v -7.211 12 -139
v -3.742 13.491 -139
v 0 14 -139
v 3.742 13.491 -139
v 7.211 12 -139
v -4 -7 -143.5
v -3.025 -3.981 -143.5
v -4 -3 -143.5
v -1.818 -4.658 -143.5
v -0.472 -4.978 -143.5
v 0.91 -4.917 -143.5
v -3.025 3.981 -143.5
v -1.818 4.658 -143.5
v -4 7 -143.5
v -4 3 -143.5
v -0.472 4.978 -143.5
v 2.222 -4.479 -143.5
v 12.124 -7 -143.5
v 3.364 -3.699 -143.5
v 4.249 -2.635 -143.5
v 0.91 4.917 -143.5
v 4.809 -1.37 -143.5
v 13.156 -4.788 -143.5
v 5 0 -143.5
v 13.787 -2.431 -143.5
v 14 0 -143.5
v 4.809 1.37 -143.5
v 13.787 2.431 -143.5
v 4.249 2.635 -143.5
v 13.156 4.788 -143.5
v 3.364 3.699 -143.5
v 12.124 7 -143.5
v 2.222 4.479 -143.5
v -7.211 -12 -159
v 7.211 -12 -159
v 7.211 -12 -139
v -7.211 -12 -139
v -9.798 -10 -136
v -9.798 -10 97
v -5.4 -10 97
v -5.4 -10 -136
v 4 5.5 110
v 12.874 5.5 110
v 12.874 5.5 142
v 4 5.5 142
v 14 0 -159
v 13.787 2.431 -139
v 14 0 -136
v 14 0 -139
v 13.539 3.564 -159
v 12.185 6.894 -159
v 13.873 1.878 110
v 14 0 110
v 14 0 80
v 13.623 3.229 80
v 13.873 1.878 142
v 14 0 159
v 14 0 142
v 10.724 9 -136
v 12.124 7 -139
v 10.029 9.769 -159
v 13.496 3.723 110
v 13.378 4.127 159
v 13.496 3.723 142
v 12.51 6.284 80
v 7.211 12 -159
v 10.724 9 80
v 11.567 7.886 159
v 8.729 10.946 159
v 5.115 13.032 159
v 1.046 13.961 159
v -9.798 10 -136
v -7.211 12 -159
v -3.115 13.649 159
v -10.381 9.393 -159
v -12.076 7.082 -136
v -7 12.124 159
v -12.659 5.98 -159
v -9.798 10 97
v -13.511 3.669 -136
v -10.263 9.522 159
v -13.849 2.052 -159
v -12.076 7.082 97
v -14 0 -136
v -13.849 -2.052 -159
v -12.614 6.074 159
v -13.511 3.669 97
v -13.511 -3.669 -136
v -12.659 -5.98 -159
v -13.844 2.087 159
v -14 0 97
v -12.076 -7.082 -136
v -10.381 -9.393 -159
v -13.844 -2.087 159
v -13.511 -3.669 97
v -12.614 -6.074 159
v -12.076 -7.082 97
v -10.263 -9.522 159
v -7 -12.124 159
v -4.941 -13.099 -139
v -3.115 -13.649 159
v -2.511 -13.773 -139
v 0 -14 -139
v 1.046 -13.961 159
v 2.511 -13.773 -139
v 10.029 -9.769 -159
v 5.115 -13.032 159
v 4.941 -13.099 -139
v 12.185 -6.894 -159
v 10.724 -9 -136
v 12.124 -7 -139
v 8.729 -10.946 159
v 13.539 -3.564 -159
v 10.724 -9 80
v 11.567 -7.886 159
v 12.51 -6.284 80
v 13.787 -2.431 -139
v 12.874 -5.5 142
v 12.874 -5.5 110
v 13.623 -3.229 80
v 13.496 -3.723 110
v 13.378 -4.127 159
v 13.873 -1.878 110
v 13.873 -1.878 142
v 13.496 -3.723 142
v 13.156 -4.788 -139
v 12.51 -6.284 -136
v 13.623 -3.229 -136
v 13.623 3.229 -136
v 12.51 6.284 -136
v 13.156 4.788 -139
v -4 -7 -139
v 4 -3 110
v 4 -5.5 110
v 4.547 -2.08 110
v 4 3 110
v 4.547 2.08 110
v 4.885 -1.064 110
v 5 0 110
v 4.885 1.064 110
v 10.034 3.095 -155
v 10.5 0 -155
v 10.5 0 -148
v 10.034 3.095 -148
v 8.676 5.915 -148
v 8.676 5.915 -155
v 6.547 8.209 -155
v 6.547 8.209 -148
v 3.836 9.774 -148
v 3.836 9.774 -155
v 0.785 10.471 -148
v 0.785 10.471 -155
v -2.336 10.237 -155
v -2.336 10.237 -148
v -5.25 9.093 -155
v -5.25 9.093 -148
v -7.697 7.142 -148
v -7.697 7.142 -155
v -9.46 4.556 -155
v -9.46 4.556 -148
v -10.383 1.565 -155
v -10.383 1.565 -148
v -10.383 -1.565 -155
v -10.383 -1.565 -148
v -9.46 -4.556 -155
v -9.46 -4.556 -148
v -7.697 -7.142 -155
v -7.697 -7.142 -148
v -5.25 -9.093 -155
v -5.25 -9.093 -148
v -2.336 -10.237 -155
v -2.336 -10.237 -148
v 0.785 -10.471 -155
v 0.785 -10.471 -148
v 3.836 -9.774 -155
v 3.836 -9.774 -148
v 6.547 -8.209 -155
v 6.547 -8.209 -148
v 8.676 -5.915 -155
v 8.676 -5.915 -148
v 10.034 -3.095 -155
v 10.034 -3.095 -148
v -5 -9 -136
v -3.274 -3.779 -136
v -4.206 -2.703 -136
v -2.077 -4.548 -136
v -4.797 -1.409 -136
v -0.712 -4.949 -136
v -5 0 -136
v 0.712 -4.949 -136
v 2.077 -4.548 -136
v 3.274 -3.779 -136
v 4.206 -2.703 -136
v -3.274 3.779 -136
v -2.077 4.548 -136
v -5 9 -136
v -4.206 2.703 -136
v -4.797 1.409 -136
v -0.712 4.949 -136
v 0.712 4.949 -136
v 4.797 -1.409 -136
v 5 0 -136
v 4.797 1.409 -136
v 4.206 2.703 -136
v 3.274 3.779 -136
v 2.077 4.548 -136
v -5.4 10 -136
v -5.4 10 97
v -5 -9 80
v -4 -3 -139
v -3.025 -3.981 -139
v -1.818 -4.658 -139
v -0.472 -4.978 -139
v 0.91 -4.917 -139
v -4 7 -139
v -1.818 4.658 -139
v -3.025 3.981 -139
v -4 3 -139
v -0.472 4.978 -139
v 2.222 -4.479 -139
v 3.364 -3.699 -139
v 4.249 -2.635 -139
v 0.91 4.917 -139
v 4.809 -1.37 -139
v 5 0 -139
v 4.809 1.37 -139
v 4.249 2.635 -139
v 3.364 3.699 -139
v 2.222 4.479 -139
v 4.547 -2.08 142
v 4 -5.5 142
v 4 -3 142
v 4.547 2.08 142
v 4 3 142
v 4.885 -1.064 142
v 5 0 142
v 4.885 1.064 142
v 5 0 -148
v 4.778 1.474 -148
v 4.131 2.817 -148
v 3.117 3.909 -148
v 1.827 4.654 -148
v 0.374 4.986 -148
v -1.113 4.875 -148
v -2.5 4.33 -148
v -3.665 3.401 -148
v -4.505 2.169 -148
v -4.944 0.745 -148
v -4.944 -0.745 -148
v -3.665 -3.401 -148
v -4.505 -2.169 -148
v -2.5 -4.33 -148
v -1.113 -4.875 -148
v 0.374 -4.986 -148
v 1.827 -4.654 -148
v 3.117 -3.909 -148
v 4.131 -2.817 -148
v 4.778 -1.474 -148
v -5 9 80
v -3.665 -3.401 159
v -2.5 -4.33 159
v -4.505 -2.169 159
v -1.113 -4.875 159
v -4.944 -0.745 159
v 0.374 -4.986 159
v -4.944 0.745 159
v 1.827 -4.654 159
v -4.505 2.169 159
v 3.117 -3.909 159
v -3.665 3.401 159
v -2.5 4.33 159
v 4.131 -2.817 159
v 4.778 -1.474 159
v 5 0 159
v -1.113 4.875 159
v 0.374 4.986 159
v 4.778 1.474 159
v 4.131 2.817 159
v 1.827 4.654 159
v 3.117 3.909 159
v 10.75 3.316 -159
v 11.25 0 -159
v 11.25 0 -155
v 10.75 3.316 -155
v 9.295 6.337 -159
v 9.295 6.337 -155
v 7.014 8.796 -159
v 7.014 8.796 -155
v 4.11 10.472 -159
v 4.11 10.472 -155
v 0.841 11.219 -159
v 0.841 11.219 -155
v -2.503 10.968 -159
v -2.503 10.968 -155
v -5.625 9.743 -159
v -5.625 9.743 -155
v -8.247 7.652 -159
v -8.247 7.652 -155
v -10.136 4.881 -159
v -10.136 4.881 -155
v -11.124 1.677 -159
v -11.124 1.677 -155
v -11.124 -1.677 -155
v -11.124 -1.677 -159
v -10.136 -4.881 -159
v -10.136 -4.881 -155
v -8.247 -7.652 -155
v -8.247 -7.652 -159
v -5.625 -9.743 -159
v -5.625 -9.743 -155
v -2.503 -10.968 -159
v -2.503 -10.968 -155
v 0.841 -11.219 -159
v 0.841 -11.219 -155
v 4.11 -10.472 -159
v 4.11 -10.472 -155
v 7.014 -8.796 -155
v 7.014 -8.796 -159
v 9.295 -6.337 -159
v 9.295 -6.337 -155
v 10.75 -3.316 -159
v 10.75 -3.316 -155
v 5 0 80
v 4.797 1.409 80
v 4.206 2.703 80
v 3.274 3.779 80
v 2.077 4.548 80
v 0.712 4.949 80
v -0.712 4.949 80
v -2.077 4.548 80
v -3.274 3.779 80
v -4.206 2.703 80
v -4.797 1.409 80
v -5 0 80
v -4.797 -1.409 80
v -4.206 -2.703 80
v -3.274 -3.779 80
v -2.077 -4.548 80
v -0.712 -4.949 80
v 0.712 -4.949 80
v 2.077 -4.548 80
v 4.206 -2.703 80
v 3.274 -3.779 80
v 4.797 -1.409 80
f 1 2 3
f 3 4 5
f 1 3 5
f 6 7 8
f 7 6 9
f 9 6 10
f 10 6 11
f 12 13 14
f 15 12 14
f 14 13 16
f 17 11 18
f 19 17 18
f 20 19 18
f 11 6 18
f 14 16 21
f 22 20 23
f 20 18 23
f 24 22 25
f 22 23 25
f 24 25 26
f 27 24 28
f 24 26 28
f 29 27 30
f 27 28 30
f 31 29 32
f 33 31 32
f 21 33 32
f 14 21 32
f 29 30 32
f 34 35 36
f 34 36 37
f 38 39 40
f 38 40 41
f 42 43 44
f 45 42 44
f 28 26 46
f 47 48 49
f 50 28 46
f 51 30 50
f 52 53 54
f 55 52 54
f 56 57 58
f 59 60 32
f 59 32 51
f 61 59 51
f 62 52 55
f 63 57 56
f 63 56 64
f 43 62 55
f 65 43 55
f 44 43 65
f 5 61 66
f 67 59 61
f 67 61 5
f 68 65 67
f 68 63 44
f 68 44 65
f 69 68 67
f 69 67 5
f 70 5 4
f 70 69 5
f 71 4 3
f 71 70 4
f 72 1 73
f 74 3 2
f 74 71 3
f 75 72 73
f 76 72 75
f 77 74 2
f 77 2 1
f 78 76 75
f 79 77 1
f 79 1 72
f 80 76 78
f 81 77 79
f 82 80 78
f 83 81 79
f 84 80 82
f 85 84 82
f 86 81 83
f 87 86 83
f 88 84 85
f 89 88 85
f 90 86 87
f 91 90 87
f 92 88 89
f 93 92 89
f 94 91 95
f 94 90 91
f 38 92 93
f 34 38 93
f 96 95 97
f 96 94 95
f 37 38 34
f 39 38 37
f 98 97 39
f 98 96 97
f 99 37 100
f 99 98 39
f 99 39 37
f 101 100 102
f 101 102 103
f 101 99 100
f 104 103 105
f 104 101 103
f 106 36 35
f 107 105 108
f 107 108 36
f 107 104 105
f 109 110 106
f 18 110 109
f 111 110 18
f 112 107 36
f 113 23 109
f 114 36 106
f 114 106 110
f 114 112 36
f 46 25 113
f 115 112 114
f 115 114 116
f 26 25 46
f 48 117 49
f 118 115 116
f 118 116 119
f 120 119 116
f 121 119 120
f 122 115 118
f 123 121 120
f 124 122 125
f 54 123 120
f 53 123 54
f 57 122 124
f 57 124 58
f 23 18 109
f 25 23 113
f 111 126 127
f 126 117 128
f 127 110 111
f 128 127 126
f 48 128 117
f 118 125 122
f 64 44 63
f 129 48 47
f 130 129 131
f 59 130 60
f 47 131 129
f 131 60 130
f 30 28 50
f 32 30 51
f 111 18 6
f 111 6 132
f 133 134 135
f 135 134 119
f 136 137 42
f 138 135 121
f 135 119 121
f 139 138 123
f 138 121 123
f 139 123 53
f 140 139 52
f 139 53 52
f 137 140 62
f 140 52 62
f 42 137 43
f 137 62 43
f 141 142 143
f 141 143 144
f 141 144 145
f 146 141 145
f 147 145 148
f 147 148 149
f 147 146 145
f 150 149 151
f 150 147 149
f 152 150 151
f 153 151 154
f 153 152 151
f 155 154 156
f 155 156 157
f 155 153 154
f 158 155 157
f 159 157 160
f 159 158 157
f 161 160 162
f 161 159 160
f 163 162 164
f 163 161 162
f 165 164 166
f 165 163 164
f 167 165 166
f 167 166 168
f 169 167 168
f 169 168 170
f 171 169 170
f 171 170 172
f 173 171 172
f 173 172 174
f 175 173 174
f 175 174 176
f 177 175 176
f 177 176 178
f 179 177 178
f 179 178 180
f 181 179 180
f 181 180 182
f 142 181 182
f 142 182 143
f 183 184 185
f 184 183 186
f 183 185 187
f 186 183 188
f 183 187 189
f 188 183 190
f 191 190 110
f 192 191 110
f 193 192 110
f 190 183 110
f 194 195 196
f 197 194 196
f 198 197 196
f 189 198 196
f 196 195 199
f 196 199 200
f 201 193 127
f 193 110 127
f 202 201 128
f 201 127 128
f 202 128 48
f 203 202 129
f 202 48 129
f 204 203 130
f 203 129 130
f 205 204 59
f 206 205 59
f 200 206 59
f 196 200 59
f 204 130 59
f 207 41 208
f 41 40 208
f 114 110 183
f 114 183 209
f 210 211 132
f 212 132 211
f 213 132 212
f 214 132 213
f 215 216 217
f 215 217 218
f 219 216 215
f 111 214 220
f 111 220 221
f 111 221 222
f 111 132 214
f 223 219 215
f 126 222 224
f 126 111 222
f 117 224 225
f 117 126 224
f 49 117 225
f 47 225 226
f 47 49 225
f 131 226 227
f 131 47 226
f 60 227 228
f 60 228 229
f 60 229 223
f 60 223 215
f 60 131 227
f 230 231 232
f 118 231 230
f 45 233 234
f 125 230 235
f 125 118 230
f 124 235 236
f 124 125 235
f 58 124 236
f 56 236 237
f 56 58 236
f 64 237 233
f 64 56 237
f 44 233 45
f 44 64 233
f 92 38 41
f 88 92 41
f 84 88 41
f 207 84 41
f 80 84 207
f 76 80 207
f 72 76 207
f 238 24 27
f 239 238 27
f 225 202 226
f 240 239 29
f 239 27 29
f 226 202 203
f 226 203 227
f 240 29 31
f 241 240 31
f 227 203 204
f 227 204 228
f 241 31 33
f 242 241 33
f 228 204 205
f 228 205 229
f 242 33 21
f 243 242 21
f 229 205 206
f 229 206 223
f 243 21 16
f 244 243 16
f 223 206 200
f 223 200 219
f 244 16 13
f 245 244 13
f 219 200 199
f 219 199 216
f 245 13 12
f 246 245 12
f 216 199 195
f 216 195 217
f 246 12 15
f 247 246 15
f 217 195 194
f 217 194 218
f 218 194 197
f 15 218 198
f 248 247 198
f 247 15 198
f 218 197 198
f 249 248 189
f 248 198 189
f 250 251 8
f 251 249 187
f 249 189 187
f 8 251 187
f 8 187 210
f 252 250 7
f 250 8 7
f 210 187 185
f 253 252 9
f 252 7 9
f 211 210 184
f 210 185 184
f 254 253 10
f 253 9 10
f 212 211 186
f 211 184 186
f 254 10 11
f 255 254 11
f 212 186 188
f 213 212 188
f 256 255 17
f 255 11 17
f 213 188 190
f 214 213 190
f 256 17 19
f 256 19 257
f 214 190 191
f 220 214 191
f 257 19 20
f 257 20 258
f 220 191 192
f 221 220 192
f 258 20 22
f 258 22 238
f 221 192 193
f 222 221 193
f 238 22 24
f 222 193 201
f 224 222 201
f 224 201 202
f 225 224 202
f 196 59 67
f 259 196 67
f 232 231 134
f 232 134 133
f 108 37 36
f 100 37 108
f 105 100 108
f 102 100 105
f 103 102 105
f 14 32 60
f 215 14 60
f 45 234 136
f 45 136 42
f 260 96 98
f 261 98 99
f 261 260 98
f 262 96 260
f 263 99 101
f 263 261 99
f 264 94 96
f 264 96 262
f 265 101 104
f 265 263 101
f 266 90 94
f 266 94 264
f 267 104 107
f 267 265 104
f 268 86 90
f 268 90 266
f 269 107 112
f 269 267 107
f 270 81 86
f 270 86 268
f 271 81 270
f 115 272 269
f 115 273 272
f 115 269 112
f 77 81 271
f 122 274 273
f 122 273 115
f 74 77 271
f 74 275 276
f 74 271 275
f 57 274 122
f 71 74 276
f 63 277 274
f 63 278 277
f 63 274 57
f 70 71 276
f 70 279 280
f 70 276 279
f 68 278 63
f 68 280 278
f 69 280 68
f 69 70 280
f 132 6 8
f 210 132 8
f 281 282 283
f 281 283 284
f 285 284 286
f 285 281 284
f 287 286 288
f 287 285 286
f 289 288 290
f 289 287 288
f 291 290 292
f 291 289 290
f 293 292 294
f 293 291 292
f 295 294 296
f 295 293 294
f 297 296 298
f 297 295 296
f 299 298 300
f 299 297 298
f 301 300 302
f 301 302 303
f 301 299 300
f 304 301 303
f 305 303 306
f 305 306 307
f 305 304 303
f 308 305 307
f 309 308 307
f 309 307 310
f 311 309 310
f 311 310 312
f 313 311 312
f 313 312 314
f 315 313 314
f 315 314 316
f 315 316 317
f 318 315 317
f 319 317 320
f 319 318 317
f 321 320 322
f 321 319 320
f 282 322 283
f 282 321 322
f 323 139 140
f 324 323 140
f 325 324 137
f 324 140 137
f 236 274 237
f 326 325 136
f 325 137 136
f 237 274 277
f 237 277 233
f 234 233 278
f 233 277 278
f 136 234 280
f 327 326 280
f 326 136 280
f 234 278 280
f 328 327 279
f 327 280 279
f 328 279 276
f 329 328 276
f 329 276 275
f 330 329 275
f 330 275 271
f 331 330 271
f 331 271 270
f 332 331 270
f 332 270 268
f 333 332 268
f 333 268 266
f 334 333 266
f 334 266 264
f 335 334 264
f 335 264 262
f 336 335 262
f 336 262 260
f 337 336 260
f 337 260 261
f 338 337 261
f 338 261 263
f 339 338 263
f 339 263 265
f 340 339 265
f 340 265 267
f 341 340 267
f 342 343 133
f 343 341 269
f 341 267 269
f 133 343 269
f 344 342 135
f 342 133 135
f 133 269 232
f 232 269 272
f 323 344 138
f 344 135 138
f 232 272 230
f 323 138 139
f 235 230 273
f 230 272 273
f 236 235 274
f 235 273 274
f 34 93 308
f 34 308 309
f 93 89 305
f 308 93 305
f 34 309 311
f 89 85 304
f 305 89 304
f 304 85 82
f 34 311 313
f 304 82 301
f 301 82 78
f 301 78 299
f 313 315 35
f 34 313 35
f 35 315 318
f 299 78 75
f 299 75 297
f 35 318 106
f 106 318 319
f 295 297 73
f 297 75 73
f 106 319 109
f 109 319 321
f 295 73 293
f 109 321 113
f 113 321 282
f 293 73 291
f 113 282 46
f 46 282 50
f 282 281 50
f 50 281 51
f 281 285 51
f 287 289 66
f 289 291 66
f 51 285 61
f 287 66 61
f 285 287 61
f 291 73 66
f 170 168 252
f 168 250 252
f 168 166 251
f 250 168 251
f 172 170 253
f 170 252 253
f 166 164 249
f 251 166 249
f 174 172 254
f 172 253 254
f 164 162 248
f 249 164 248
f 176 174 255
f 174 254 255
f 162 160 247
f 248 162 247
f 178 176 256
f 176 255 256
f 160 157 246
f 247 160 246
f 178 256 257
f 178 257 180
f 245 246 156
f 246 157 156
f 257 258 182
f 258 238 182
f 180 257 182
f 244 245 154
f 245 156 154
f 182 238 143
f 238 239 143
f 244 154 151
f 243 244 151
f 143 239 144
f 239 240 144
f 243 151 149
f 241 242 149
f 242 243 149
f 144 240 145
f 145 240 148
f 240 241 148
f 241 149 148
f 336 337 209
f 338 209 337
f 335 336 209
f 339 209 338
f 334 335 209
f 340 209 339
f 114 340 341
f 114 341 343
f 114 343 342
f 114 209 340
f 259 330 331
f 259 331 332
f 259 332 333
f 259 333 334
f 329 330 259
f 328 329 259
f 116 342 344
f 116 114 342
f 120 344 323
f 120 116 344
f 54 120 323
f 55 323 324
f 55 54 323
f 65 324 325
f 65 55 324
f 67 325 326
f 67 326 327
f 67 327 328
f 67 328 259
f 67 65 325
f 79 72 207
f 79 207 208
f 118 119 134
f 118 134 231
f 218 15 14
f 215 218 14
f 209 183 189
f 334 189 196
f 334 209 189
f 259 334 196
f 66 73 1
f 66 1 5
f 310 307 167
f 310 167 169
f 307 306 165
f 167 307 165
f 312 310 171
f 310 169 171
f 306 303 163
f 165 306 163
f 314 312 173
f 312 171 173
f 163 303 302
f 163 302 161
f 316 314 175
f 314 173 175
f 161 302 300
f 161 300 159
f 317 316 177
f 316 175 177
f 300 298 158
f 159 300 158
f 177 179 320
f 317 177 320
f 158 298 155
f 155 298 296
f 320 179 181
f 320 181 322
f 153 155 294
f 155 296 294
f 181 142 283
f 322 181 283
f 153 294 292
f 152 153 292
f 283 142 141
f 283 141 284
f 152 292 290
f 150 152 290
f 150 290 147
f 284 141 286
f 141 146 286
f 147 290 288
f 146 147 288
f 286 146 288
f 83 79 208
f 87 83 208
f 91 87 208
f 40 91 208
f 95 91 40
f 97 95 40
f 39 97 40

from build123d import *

# Parameters (mm, degrees)
F0_R      = 14
F1_DEPTH  = 159
F3_W      = 18
F3_H      = 216
F4_DEPTH  = 19
F3_W_2    = 14
F3_H_2    = 4.5
F5_DEPTH  = 18
F7_W      = 20
F7_H      = 29
F7_H_2    = 25
F7_H_3    = 23
F8_DEPTH  = 8.6
F3_W_3    = 11
F3_H_3    = 32
F9_DEPTH  = 10
F13_R     = 10.5
F14_DEPTH = 11
F11_R     = 5
F15_DEPTH = 318
F13_R_2   = 11.25
F16_DEPTH = 4
F17_DEPTH = 20


with BuildPart() as f1:
    # F0 (on Top) → F1 (new body, symmetric)
    with BuildSketch(Plane.XY):
        Circle(F0_R)
    extrude(amount=F1_DEPTH, both=True)

    # F3 (on offset) → F4 (cut)
    with BuildSketch(Plane.YZ.offset(14)):
        with Locations((0, -28)):
            Rectangle(F3_W, F3_H)
    extrude(amount=-F4_DEPTH, mode=Mode.SUBTRACT)

    # F3 (on offset) → F5 (cut)
    with BuildSketch(Plane.YZ.offset(14)):
        with Locations((0, -141.25)):
            Rectangle(F3_W_2, F3_H_2)
    extrude(amount=-F5_DEPTH, mode=Mode.SUBTRACT)

    # F7 (on offset) → F8 (cut)
    with BuildSketch(Plane.YZ.offset(-14)):
        Polygon((-10, -98), (-10, -136), (-2.5, -136), (2.5, -136), (10, -136), (10, -98), align=None)
        with Locations((0, -60.5)):
            Rectangle(F7_W, F7_H)
        with Locations((0, -10.5)):
            Rectangle(F7_W, F7_H_2)
        Polygon((-10, 47), (-10, 25), (10, 25), (10, 47), (2.5, 47), (-2.5, 47), align=None)
        with Locations((0, -86.5)):
            Rectangle(F7_W, F7_H_3)
        with Locations((0, -34.5)):
            Rectangle(F7_W, F7_H_3)
        with Locations((0, 13.5)):
            Rectangle(F7_W, F7_H_3)
        Polygon((-10, 97), (-10, 47), (-2.5, 47), (2.5, 47), (10, 47), (10, 97), align=None)
    extrude(amount=F8_DEPTH, mode=Mode.SUBTRACT)

    # F3 (on offset) → F9 (cut)
    with BuildSketch(Plane.YZ.offset(14)):
        with Locations((0, 126)):
            Rectangle(F3_W_3, F3_H_3)
    extrude(amount=-F9_DEPTH, mode=Mode.SUBTRACT)

    # F13 (on offset) → F14 (cut)
    with BuildSketch(Plane.XY.offset(-159)):
        Circle(F13_R)
    extrude(amount=F14_DEPTH, mode=Mode.SUBTRACT)

    # F11 (on offset) → F15 (cut)
    with BuildSketch(Plane.XY.offset(159)):
        Circle(F11_R)
    extrude(amount=-F15_DEPTH, mode=Mode.SUBTRACT)

    # F13 (on offset) → F16 (cut)
    with BuildSketch(Plane.XY.offset(-159)):
        Circle(F13_R_2)
        Circle(F13_R, mode=Mode.SUBTRACT)
    extrude(amount=F16_DEPTH, mode=Mode.SUBTRACT)

    # F13 (on offset) → F17 (cut)
    with BuildSketch(Plane.XY.offset(-159)):
        with BuildLine():
            ThreePointArc((-7.2111025509, -12), (-3.7416573868, -13.4907375632), (0, -14))
            Line((0, -14), (0, -12))
            Line((0, -12), (-7.2111025509, -12))
        make_face()
        with BuildLine():
            ThreePointArc((0, -14), (3.7416573868, -13.4907375632), (7.2111025509, -12))
            Line((7.2111025509, -12), (0, -12))
            Line((0, -12), (0, -14))
        make_face()
        with BuildLine():
            Line((-7.2111025509, 12), (7.2111025509, 12))
            ThreePointArc((7.2111025509, 12), (0, 14), (-7.2111025509, 12))
        make_face()
    extrude(amount=F17_DEPTH, mode=Mode.SUBTRACT)


solid = f1.part
